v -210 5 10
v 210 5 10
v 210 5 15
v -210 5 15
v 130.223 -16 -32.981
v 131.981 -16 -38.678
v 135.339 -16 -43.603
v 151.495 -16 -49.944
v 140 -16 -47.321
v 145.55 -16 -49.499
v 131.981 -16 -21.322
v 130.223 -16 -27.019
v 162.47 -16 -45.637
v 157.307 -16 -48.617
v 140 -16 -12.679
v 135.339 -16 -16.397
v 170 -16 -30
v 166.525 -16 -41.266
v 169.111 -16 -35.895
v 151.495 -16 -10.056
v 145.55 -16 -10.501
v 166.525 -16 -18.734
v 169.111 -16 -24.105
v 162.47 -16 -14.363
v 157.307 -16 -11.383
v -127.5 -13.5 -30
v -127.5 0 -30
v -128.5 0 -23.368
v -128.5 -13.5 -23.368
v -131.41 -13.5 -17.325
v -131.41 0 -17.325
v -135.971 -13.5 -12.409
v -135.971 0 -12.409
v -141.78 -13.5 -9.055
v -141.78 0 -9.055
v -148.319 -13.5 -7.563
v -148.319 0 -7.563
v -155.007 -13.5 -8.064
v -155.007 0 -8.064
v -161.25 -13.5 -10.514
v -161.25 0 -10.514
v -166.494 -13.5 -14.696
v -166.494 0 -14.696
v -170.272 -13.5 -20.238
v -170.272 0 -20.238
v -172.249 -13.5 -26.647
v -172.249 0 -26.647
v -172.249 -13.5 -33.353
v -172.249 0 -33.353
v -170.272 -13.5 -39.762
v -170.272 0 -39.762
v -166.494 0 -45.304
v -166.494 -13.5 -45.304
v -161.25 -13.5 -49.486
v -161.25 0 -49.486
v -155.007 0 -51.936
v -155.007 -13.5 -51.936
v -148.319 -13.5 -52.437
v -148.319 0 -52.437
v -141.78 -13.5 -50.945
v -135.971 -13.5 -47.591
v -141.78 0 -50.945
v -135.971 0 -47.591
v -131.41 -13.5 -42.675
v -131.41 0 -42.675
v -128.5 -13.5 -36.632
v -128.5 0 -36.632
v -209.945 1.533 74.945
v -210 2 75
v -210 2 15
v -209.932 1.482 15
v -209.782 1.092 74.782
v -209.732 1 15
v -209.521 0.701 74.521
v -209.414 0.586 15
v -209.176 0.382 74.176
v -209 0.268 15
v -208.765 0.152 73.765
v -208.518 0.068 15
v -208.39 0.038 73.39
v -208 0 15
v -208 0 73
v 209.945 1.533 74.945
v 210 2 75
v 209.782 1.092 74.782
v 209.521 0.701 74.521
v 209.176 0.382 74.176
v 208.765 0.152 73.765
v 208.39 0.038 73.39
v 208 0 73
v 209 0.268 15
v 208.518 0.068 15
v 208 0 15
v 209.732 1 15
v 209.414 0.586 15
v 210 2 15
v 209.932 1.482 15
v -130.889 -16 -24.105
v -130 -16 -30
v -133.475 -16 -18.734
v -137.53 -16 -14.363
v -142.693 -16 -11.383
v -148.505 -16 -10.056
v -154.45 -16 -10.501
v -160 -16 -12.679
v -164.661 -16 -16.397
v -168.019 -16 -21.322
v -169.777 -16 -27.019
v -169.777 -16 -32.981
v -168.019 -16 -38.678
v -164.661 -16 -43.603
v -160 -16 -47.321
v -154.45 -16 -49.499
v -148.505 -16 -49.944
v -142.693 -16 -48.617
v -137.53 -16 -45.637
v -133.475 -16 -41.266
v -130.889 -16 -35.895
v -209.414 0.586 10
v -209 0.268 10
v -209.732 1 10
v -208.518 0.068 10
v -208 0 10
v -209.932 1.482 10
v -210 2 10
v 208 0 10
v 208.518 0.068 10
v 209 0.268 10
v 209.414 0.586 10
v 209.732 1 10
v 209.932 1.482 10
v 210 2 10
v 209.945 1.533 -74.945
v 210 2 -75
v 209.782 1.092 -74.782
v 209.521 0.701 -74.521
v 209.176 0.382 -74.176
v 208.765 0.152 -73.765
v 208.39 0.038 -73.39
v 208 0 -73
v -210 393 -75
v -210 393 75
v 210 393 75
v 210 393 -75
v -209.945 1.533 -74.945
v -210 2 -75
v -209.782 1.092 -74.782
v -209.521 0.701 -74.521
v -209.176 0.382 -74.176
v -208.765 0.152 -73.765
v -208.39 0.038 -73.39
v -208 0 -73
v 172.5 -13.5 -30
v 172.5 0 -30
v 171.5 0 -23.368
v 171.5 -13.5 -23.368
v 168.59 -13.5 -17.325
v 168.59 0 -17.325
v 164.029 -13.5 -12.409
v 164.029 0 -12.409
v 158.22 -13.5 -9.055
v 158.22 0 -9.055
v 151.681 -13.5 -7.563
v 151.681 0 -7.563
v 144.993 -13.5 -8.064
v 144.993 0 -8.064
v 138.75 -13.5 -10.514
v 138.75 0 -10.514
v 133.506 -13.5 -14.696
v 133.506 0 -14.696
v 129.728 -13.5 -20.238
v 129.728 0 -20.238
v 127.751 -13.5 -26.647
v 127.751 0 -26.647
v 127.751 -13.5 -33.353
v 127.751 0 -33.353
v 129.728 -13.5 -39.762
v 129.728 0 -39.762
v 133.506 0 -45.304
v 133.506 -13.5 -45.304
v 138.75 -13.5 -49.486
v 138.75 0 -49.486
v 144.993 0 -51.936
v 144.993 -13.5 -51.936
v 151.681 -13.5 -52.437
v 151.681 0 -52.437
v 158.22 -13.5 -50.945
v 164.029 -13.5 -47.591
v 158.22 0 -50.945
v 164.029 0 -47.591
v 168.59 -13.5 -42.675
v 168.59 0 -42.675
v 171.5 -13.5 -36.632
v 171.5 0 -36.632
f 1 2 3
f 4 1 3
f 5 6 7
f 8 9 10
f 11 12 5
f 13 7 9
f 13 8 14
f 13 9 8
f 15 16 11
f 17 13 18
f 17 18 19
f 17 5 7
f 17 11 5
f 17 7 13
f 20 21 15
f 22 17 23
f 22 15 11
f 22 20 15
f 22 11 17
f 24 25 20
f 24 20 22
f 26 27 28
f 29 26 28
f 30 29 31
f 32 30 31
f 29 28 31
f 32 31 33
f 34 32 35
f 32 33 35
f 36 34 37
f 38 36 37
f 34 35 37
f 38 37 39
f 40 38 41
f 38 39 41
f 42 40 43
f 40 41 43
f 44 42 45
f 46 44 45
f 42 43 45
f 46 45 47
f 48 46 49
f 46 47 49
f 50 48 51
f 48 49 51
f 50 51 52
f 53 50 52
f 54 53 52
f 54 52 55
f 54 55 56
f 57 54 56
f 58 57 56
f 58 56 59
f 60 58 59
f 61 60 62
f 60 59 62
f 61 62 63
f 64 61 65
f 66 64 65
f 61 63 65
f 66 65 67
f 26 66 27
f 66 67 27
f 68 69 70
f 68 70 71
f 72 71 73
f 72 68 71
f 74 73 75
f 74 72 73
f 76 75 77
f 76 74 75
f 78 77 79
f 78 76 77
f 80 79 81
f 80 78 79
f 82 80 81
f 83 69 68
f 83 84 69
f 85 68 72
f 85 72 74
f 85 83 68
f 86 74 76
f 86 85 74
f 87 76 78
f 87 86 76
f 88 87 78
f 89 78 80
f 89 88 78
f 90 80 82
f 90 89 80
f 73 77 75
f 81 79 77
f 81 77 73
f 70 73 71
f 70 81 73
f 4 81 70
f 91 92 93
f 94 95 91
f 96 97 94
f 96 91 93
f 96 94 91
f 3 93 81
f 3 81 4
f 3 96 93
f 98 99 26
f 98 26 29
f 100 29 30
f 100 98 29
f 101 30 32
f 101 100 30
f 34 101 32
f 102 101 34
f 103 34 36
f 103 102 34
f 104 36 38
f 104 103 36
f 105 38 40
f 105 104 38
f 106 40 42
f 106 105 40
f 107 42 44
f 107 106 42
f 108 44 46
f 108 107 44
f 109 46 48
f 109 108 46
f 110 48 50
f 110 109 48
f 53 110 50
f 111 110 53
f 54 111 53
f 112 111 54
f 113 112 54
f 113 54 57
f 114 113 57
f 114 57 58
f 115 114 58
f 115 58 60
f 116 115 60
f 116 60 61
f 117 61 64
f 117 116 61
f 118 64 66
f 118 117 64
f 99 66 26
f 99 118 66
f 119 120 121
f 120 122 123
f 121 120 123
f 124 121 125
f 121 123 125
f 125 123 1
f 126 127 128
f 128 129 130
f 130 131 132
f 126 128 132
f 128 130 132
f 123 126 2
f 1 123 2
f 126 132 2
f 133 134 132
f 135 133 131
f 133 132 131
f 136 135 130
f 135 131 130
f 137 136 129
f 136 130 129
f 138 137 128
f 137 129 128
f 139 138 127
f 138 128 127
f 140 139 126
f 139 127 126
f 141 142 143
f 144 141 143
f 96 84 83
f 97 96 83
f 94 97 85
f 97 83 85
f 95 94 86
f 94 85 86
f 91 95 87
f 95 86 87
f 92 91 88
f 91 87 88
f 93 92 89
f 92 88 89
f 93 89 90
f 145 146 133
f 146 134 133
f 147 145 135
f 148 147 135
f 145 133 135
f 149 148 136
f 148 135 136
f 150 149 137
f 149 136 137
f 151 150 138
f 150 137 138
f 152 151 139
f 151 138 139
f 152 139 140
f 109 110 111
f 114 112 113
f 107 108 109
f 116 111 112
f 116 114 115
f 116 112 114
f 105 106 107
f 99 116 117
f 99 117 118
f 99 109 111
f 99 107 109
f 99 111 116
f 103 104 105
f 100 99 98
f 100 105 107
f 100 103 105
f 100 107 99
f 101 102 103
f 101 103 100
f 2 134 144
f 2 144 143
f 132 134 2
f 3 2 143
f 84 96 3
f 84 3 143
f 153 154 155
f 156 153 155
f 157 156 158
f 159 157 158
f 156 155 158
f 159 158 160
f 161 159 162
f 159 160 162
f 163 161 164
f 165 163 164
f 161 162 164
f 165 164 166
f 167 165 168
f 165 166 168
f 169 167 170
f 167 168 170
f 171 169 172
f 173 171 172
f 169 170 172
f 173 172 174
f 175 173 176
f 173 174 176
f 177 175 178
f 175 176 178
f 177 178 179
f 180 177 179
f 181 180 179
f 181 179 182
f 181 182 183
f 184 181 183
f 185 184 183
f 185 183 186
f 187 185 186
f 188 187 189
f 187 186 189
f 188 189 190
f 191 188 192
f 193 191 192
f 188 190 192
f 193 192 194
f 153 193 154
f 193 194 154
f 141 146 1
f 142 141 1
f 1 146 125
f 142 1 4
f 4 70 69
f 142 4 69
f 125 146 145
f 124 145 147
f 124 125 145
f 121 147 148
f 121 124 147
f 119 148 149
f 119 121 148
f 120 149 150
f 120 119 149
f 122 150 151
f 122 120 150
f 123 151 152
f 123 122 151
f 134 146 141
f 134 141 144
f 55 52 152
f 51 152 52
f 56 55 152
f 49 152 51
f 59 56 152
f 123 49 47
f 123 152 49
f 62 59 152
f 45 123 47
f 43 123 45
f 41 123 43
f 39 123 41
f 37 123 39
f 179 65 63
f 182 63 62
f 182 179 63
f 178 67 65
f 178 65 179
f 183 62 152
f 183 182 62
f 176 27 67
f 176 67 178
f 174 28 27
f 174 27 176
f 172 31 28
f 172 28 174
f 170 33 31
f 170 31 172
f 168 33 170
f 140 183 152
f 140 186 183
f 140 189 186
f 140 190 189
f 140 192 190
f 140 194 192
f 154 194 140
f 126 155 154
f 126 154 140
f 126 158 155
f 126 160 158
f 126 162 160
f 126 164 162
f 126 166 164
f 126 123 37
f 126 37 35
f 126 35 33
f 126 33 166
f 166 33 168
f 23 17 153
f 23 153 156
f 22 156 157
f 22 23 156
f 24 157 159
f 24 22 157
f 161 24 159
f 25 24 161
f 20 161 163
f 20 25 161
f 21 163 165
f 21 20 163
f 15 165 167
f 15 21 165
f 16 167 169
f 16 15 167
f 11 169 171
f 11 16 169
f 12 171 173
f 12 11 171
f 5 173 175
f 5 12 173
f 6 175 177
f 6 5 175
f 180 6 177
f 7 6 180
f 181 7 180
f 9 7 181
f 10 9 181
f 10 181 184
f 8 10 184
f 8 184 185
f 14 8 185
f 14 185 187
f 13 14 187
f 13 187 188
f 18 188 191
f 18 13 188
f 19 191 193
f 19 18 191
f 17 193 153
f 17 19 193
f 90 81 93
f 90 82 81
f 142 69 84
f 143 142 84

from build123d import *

# Parameters (mm, degrees)
F0_W     = 420
F0_H     = 150
F1_DEPTH = 393
F2_R     = 2
F3_R     = 22.5
F4_DEPTH = 16
F5_SIZE  = 2.5
F6_W     = 5
F6_H     = 5
F7_DEPTH = 250


with BuildPart() as f1:
    # F0 (on Front) → F1 (new body)
    with BuildSketch(Plane.XZ):
        Rectangle(F0_W, F0_H)
    extrude(amount=-F1_DEPTH)

    # F2
    f2_edges = [f1.edges().sort_by_distance(p)[0] for p in [
        (210, 0, 0),
        (0, 0, 75),
        (-210, 0, 0),
        (0, 0, -75),
    ]]
    fillet(f2_edges, radius=F2_R)

    # F3 (on face) → F4 (join)
    with BuildSketch(Plane.XZ):
        with Locations((-150, -30)):
            Circle(F3_R)
        with Locations((150, -30)):
            Circle(F3_R)
    extrude(amount=F4_DEPTH)

    # F5
    f5_edges = [f1.edges().sort_by_distance(p)[0] for p in [
        (-172.5, -16, -30),
        (127.5, -16, -30),
    ]]
    chamfer(f5_edges, length=F5_SIZE)

    # F6 (on Right) → F7 (cut, symmetric)
    with BuildSketch(Plane.YZ):
        with Locations((2.5, 12.5)):
            Rectangle(F6_W, F6_H)
    extrude(amount=F7_DEPTH, both=True, mode=Mode.SUBTRACT)


solid = f1.part
